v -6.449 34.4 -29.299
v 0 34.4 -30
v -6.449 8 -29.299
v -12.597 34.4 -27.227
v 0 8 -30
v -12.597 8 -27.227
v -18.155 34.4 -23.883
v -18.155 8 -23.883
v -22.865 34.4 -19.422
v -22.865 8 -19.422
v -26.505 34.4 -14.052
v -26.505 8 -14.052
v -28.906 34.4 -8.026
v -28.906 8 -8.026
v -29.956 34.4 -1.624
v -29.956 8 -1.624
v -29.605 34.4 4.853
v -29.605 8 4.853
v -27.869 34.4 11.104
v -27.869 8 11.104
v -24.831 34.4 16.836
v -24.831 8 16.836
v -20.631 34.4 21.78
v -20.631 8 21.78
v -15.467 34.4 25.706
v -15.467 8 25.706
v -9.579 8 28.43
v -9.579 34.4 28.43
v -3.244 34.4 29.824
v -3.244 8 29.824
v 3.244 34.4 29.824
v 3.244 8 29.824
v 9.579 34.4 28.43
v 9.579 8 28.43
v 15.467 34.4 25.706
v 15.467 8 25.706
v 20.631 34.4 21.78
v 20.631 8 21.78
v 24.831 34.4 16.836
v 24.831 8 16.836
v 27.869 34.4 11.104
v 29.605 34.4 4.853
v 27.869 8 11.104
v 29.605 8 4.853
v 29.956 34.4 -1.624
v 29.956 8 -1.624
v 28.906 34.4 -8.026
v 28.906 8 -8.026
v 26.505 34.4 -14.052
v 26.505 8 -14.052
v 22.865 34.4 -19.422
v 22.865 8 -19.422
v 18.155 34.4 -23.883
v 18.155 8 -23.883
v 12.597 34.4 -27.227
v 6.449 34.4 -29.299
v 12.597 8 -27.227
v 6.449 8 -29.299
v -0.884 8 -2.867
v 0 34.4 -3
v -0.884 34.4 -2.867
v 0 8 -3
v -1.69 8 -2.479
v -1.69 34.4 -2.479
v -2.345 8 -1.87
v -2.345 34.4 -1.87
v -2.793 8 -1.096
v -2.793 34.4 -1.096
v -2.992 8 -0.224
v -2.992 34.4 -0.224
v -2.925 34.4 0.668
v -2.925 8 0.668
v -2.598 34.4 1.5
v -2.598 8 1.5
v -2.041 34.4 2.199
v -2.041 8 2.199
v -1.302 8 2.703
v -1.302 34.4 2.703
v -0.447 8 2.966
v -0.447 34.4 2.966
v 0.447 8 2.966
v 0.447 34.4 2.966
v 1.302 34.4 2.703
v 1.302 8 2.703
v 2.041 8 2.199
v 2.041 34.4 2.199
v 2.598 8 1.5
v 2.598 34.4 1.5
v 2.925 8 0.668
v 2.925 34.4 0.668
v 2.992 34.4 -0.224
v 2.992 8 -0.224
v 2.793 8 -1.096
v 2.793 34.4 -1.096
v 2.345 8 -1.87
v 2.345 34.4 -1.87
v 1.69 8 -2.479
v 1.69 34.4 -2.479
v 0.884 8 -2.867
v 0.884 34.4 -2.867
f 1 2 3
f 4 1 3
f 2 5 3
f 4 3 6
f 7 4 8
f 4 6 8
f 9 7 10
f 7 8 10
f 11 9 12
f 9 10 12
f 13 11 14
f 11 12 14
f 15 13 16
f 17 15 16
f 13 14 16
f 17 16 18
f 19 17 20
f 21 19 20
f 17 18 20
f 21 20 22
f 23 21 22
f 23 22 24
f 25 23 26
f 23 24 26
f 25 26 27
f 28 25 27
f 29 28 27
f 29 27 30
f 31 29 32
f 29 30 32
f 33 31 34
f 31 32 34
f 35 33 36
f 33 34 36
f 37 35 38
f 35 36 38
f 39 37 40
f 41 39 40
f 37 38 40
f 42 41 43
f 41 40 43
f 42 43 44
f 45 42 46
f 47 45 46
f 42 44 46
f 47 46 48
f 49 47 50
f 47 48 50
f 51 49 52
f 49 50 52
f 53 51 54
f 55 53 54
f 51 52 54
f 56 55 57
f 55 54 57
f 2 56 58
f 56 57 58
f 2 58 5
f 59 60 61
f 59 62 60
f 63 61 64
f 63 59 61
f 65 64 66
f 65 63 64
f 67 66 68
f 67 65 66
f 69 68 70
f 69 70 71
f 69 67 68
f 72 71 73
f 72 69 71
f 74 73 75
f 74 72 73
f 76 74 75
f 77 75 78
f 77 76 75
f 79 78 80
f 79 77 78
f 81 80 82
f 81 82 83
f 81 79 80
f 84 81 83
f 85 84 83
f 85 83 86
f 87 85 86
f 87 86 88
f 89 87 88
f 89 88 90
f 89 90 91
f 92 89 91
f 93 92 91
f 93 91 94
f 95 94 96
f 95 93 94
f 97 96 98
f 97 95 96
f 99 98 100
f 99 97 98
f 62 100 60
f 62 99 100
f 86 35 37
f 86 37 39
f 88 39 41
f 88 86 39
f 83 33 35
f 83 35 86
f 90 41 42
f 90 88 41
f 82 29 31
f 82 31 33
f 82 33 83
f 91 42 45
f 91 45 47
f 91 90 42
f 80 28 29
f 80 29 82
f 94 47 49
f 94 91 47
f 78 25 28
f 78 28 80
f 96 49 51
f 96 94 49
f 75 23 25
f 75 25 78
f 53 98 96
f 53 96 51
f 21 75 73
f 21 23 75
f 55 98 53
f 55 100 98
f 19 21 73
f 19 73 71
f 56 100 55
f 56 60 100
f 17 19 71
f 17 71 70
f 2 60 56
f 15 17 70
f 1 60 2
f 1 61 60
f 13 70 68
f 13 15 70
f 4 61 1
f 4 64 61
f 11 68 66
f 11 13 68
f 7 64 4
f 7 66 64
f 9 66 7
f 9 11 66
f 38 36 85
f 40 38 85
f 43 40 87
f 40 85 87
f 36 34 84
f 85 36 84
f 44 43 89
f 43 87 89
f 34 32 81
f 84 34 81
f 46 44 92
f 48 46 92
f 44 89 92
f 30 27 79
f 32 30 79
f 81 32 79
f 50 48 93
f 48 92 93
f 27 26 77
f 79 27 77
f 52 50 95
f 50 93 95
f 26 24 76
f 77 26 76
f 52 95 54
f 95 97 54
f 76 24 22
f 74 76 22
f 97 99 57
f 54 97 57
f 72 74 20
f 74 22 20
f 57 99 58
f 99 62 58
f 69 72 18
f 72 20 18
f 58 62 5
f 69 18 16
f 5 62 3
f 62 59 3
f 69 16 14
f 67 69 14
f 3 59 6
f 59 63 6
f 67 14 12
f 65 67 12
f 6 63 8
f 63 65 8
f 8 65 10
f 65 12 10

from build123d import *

# Parameters (mm, degrees)
SKETCH_1_R          = 50
EXTRUDE_3_DEPTH     = 45
SKETCH_5_R          = 5
CUT_EXTRUDE_1_DEPTH = 84.815273071
CUT_EXTRUDE_START   = -5
SKETCH_6_R          = 50
CUT_EXTRUDE_2_DEPTH = 5
SCALE_3_SCALE       = 0.5
SCALE_4_SCALE       = 1.2
SKETCH_7_R          = 30
SKETCH_7_R_2        = 3
EXTRUDE_4_DEPTH     = 2.4


with BuildPart() as part:
    # 草图1 → 凸台-拉伸3 (new body)
    with BuildSketch(Plane(origin=(0, 0, 0), x_dir=(1, 0, 0), z_dir=(0, 1, 0))):
        with Locations(Location((0, 0, 0), (0, 0, 90))):
            Circle(SKETCH_1_R)
    extrude(amount=EXTRUDE_3_DEPTH)

    # 草图5 → 切除-拉伸1 (cut, through all)
    with BuildSketch(Plane.XZ):
        with Locations(Location((0, 0, 0), (0, 0, 270))):
            Circle(SKETCH_5_R)
    extrude(amount=-CUT_EXTRUDE_1_DEPTH, mode=Mode.SUBTRACT)

    # 草图6 → 切除-拉伸2 (cut)
    with BuildSketch(Plane(origin=(0, 45, 0), x_dir=(1, 0, 0), z_dir=(0, 1, 0)).offset(CUT_EXTRUDE_START)):
        with Locations(Location((0, 0, 0), (0, 0, 90))):
            Circle(SKETCH_6_R)
    extrude(amount=CUT_EXTRUDE_2_DEPTH, mode=Mode.SUBTRACT)


with BuildPart() as part_1:
    # 缩放比例3: scaled about (0, 20, 0)
    add(part.part.scale(SCALE_3_SCALE).moved(Location((0, 10, 0))))


with BuildPart() as part_2:
    # 缩放比例4: scaled about (0, 20, 0)
    add(part_1.part.scale(SCALE_4_SCALE).moved(Location((0, -4, 0))))

    # 草图7 → 凸台-拉伸4 (add)
    with BuildSketch(Plane(origin=(0, 32, 0), x_dir=(1, 0, 0), z_dir=(0, 1, 0))):
        with Locations(Location((0, 0, 0), (0, 0, 90))):
            Circle(SKETCH_7_R)
        with Locations(Location((0, 0, 0), (0, 0, 90))):
            Circle(SKETCH_7_R_2, mode=Mode.SUBTRACT)
    extrude(amount=EXTRUDE_4_DEPTH)


solid = part_2.part
